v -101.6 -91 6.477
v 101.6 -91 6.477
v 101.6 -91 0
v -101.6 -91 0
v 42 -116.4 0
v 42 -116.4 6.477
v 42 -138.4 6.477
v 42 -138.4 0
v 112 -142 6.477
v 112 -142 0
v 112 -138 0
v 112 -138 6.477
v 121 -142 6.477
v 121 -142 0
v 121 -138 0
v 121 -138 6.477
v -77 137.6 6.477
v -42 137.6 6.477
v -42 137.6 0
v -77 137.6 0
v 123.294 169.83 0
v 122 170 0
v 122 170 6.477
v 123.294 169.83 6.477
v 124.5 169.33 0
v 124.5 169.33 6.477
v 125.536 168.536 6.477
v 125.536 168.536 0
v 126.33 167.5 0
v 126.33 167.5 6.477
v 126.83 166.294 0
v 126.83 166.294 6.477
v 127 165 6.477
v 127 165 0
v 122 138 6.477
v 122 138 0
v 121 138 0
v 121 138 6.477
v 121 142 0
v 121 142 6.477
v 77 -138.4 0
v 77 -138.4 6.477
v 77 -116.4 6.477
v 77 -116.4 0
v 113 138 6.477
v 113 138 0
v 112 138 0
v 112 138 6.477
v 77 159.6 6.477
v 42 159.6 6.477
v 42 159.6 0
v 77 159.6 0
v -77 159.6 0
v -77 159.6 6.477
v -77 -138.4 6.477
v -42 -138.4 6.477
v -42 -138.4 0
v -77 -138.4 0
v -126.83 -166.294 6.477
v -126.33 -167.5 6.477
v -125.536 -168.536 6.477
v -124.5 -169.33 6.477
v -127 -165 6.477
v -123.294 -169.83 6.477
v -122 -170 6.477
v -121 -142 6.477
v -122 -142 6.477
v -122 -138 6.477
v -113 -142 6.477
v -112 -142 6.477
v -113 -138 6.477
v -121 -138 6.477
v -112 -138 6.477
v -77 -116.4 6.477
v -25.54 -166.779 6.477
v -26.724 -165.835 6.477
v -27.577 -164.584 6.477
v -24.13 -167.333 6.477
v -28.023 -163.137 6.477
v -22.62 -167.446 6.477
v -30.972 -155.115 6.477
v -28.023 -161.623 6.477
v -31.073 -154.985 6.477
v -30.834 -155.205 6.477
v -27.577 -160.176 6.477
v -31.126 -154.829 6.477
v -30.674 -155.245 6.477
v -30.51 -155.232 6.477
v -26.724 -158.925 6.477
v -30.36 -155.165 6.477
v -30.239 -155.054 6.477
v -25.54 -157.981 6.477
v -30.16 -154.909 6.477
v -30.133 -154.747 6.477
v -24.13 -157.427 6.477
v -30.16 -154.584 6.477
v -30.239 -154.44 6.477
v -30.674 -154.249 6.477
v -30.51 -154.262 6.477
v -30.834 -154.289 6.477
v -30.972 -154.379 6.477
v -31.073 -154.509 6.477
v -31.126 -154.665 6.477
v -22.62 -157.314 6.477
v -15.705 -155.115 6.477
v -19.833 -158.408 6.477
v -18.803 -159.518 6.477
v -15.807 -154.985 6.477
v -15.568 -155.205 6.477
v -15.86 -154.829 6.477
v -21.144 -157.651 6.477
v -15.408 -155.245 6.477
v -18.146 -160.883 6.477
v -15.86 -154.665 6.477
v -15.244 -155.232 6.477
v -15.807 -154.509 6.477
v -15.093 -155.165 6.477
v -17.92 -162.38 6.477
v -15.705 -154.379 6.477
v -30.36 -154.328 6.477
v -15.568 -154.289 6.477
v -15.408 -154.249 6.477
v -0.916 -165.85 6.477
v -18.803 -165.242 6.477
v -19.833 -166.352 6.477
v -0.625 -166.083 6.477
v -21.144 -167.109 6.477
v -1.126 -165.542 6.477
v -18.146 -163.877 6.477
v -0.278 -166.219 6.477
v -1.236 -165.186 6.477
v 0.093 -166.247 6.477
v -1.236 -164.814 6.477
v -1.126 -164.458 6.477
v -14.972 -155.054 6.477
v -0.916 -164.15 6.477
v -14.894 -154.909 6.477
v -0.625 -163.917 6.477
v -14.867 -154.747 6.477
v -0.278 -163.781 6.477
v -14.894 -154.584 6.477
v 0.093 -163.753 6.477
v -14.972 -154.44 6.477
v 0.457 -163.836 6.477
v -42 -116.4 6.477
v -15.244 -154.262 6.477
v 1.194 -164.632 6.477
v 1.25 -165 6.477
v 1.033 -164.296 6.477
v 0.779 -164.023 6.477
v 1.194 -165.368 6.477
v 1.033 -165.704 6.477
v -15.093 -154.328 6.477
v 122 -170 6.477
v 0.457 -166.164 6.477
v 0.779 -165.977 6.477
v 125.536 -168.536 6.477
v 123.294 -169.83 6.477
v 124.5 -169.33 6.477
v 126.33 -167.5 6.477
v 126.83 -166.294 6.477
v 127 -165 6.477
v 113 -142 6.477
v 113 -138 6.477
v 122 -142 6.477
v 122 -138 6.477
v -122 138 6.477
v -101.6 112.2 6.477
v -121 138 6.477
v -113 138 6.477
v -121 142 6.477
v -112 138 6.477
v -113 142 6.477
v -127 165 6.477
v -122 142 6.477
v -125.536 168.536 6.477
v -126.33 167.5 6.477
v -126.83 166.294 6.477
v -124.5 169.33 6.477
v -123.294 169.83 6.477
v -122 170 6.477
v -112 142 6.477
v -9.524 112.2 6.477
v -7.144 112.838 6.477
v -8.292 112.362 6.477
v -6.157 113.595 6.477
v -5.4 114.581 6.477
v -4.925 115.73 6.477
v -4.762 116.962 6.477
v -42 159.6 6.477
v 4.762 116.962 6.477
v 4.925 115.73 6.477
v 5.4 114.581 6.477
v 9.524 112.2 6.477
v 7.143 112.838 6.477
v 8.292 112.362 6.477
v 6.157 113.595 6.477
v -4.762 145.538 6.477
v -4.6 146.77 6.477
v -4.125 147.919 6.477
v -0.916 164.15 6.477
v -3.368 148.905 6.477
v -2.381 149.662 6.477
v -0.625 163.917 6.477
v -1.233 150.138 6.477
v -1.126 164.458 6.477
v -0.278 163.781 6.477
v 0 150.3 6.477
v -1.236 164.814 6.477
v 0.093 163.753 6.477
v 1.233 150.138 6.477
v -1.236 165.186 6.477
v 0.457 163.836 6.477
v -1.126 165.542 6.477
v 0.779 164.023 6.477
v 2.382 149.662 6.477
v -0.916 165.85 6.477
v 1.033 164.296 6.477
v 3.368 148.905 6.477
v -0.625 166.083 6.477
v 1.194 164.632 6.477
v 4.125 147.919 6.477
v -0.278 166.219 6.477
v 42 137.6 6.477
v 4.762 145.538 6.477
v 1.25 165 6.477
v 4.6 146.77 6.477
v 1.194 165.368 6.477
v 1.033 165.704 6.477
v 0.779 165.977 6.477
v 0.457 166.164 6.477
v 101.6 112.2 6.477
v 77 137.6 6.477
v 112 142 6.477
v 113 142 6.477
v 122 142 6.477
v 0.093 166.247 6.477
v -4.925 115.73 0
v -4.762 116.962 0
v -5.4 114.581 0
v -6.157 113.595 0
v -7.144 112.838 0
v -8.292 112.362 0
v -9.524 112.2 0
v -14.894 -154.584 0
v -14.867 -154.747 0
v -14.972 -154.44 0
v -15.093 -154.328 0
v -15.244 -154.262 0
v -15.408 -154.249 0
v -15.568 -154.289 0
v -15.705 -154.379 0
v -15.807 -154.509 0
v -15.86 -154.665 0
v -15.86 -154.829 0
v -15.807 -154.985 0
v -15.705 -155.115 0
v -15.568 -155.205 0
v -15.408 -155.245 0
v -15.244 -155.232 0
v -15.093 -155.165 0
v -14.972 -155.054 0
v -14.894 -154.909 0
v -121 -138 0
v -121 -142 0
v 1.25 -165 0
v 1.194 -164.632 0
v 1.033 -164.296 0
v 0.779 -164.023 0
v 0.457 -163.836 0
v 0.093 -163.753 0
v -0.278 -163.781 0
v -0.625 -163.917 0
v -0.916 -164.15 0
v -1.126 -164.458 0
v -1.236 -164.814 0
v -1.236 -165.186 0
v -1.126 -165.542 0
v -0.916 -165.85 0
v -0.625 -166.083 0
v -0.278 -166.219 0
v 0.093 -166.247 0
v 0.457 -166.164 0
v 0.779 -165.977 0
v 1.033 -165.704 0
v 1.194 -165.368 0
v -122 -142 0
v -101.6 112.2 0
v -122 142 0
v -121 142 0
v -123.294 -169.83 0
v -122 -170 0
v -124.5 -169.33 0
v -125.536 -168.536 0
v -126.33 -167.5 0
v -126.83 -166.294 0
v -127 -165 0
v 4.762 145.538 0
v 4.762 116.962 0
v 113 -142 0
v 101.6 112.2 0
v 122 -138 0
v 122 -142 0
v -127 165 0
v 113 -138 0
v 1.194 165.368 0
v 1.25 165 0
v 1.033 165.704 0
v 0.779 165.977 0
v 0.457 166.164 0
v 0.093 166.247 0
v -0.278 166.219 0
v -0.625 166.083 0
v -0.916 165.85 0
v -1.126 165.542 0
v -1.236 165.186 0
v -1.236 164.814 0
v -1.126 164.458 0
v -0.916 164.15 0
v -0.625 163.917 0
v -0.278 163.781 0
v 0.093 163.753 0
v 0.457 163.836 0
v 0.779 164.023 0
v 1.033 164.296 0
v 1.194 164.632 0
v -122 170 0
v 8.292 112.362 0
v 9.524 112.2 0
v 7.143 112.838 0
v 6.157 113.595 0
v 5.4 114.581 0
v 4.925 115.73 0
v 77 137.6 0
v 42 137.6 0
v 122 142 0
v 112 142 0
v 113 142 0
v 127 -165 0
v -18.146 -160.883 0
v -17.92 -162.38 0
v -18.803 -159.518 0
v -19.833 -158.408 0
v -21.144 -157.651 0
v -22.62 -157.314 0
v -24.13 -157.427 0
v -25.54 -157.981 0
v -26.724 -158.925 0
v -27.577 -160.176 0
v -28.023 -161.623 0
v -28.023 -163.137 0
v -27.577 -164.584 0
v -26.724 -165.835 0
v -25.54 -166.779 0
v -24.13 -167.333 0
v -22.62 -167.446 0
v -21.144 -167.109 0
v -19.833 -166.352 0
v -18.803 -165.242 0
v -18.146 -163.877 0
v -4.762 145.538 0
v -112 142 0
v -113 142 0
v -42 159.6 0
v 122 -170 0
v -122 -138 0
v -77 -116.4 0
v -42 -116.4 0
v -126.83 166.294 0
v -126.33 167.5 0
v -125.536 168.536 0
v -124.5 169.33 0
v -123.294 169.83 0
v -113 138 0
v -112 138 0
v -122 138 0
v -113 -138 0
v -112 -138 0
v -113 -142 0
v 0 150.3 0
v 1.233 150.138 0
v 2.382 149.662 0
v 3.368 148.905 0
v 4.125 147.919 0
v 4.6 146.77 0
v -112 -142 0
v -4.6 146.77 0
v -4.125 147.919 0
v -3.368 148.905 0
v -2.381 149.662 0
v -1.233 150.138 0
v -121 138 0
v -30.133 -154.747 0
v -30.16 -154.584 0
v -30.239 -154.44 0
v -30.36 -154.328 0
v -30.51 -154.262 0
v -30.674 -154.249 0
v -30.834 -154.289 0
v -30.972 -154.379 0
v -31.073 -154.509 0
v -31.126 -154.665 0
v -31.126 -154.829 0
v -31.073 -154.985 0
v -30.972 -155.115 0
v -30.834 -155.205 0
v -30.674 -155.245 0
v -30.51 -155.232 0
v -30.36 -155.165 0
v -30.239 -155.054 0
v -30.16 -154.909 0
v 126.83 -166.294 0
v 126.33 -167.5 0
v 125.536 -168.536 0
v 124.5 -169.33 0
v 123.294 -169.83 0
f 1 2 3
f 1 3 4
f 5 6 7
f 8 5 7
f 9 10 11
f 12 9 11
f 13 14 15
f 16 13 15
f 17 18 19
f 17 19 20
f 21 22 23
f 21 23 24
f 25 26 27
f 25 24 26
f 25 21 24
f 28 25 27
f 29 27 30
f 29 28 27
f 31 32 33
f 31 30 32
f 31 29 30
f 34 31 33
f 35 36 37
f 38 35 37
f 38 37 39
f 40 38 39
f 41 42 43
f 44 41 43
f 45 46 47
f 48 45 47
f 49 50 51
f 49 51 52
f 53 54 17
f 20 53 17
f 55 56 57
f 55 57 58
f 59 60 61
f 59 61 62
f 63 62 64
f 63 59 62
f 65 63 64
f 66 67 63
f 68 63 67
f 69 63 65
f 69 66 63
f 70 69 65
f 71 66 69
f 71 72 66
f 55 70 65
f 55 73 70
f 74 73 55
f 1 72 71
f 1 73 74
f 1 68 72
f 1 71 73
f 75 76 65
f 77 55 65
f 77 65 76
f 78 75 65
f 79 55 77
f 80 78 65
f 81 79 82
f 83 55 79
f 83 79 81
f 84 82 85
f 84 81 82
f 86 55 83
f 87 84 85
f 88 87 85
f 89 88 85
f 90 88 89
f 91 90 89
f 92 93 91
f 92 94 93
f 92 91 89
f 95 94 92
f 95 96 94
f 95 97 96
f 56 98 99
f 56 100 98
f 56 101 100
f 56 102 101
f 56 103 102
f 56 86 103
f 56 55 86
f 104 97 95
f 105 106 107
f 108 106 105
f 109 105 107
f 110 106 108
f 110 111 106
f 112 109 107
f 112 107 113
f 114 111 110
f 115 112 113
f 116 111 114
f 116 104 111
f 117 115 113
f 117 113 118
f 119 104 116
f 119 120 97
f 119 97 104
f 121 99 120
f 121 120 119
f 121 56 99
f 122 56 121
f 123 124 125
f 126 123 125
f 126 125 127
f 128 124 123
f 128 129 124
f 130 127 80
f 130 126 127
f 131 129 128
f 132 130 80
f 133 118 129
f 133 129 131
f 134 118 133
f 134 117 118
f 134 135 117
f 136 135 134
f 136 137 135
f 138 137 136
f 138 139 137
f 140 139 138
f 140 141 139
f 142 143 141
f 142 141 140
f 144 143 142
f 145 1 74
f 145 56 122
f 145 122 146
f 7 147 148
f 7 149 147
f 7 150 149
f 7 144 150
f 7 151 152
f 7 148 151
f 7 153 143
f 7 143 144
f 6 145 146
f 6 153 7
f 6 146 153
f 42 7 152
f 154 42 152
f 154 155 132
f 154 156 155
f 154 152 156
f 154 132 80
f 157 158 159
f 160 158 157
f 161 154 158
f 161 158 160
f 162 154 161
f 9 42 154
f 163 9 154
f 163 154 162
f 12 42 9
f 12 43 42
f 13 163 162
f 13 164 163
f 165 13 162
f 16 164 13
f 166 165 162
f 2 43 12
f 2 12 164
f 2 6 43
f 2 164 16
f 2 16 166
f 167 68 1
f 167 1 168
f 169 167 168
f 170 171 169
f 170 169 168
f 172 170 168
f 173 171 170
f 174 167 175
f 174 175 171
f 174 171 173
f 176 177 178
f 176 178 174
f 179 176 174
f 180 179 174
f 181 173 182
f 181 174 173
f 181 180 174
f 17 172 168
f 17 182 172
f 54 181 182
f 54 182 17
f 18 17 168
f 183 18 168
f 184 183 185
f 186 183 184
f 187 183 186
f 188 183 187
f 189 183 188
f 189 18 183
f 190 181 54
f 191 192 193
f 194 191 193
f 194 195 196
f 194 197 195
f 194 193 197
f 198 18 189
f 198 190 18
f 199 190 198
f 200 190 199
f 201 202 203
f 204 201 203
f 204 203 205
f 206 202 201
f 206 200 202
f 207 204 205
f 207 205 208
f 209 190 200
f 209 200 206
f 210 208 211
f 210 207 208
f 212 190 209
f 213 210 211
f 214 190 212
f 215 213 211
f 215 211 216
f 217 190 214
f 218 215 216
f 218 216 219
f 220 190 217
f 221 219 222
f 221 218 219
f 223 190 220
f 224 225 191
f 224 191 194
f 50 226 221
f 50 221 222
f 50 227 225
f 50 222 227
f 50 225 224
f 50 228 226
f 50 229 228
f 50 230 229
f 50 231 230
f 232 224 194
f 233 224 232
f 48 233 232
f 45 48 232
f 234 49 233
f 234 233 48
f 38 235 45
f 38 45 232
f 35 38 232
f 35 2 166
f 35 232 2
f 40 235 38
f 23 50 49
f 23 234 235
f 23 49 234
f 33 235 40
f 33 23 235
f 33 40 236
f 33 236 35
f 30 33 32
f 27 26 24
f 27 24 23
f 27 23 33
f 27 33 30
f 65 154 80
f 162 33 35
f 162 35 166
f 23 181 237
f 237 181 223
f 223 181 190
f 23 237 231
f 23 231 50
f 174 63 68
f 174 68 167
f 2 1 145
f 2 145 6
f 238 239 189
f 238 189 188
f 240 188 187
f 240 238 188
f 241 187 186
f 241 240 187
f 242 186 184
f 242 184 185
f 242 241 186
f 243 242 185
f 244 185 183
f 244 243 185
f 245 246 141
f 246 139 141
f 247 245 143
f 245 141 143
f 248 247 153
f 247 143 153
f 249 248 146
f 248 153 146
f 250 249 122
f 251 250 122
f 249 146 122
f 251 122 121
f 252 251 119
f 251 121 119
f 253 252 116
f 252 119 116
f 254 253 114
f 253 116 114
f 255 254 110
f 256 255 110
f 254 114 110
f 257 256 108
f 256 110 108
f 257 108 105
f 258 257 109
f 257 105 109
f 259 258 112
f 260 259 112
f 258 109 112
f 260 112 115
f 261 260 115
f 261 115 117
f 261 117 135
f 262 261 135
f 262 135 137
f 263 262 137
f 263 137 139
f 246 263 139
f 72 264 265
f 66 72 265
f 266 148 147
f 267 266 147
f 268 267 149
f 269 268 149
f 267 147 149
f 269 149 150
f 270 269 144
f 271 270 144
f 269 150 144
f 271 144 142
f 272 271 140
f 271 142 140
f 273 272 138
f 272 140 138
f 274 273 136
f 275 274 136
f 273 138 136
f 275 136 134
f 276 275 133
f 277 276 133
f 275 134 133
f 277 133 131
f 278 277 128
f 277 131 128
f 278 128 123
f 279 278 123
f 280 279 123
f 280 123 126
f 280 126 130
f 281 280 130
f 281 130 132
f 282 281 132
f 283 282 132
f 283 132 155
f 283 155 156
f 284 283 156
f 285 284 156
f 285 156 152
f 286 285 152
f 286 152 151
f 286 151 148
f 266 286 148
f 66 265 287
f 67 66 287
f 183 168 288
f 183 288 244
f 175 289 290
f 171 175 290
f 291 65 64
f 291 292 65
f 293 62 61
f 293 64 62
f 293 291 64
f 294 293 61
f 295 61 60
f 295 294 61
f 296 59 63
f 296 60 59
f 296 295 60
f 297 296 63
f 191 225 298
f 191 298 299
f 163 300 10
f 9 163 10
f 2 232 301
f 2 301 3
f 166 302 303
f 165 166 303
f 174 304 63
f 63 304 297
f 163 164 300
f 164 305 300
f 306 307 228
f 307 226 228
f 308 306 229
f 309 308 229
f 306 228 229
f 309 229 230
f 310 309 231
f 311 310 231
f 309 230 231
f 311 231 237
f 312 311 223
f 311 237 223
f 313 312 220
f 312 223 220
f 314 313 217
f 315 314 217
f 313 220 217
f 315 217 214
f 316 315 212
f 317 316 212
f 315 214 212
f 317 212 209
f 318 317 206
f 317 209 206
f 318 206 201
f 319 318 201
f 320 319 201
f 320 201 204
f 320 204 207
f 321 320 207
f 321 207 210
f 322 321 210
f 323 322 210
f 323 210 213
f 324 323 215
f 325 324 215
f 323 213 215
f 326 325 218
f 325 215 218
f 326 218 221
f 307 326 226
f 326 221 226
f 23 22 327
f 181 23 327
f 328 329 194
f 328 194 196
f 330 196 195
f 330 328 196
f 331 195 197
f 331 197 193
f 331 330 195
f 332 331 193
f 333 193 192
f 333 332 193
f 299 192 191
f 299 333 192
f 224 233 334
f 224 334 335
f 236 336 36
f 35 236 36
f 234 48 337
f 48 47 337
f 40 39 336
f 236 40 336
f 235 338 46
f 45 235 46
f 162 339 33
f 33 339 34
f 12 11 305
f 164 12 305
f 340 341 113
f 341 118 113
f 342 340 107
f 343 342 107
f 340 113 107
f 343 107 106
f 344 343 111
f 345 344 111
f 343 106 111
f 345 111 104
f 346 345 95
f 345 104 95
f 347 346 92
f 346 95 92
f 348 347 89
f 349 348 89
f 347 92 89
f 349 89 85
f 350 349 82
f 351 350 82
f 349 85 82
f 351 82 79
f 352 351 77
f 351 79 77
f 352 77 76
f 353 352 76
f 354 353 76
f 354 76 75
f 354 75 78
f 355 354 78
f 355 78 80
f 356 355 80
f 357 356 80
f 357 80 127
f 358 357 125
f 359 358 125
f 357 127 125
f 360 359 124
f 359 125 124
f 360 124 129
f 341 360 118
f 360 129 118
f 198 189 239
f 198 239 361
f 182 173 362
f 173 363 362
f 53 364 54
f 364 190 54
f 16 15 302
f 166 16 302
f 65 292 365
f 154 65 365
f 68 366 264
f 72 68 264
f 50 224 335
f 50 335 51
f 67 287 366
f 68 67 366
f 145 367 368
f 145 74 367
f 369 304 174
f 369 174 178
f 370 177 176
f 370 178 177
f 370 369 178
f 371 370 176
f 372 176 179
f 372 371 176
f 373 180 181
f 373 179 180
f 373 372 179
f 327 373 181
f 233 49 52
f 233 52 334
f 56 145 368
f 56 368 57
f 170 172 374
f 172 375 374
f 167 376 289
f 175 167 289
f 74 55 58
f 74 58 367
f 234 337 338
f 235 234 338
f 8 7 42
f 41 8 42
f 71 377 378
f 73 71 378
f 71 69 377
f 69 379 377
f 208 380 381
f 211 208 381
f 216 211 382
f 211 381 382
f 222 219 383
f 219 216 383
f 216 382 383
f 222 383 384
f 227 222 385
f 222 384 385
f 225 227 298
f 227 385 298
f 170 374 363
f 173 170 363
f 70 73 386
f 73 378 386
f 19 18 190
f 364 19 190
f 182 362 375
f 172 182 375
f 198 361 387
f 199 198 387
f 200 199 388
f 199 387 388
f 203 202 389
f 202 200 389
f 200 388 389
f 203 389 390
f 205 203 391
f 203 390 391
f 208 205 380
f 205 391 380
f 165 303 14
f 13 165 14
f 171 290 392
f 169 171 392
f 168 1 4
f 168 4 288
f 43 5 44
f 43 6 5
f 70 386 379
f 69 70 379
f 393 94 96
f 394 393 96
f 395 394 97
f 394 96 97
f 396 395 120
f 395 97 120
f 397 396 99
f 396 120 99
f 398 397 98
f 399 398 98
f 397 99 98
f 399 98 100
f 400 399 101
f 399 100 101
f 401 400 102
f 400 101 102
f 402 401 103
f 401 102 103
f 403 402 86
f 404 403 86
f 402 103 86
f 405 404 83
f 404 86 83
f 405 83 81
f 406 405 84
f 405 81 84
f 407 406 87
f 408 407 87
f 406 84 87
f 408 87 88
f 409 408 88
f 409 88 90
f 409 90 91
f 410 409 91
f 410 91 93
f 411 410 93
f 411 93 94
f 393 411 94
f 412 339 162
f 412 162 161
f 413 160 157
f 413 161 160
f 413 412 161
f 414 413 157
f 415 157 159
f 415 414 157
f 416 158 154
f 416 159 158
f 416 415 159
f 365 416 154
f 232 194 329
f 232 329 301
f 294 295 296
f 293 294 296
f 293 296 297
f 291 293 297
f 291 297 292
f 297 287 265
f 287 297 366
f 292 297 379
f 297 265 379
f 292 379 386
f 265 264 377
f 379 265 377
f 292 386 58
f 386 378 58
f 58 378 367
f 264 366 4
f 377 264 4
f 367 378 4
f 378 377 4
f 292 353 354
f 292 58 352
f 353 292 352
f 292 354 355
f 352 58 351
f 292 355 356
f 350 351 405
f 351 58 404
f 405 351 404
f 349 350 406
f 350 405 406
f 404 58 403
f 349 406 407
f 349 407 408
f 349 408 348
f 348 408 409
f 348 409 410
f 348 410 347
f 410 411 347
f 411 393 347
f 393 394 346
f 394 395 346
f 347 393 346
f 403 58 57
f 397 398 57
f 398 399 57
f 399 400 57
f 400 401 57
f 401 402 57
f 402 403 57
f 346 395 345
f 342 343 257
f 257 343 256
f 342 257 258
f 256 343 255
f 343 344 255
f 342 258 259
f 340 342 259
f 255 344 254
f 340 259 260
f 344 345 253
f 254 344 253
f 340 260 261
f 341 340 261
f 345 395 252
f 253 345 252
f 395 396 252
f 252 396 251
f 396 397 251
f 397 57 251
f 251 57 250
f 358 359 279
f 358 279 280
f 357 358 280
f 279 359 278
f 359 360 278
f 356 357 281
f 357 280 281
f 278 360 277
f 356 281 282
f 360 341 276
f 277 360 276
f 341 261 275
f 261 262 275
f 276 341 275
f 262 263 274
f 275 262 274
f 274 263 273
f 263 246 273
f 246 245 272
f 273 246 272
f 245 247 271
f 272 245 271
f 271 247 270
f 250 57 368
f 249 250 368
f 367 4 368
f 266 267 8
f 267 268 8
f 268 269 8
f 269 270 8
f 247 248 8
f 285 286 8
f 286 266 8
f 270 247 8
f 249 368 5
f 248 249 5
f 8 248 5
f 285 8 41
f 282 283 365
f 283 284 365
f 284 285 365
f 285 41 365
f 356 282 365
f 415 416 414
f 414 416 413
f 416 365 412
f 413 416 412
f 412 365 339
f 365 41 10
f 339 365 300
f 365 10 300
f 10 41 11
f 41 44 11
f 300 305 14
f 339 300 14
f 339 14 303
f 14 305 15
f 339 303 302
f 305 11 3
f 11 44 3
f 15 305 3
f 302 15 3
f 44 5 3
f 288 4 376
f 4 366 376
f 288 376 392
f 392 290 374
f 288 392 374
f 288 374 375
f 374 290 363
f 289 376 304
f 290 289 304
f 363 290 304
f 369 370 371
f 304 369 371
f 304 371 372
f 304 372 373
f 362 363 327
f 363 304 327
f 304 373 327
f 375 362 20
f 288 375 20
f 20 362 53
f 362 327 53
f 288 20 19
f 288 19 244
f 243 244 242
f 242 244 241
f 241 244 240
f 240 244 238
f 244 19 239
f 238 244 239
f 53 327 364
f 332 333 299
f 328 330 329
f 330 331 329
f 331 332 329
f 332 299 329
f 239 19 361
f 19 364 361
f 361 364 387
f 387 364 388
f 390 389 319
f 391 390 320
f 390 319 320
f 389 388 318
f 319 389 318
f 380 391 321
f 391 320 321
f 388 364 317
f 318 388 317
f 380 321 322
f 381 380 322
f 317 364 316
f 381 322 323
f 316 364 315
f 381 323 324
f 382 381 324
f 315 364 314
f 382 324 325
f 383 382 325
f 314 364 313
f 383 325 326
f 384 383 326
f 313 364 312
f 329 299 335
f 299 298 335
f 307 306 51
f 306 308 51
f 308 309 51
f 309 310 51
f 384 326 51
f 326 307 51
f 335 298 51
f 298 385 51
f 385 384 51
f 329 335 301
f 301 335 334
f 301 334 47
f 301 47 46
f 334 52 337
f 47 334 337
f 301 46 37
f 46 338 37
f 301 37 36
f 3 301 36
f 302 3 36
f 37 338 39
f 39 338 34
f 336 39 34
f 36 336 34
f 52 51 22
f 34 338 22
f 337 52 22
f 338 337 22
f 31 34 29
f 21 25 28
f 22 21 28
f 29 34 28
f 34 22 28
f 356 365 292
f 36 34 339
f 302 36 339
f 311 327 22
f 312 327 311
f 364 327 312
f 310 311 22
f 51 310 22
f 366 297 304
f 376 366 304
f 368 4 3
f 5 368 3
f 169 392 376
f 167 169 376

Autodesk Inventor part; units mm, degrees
ref_plane "YZ Plane" through (0, 0, 0) normal (1, 0, 0) x (0, 1, 0)
ref_plane "XZ Plane" through (0, 0, 0) normal (0, 1, 0) x (-1, 0, 0)
ref_plane "XY Plane" through (0, 0, 0) normal (0, 0, 1) x (1, 0, 0)
sketch "Sketch1" plane through (0, 0, 0) normal (0, 0, 1) x (1, 0, 0)
  arc A0 (127, -140) -> (122, -135) centre (122, -140) ccw projected
  line L0 (122, -135) -> (119.8284, -135) projected
  line L1 (119.8284, -135) -> (119.8284, -145) projected
  line L2 (119.8284, -145) -> (114.1716, -145) projected
  line L3 (114.1716, -145) -> (114.1716, -135) projected
  line L4 (114.1716, -135) -> (109.5, -135) projected
  arc A1 (107, -132.5) -> (109.5, -135) centre (109.5, -132.5) ccw projected
  line L5 (107, -132.5) -> (107, 132.5) projected
  arc A2 (109.5, 135) -> (107, 132.5) centre (109.5, 132.5) ccw projected
  line L6 (109.5, 135) -> (114.1716, 135) projected
  line L7 (114.1716, 135) -> (114.1716, 145) projected
  line L8 (114.1716, 145) -> (119.8284, 145) projected
  line L9 (119.8284, 145) -> (119.8284, 135) projected
  line L10 (119.8284, 135) -> (122, 135) projected
  arc A3 (122, 135) -> (127, 140) centre (122, 140) ccw projected
  line L11 (127, 140) -> (127, 165) projected
  arc A4 (127, 165) -> (122, 170) centre (122, 165) ccw projected
  line L12 (122, 170) -> (-122, 170) projected
  arc A5 (-122, 170) -> (-127, 165) centre (-122, 165) ccw projected
  line L13 (-127, 165) -> (-127, 140) projected
  arc A6 (-127, 140) -> (-122, 135) centre (-122, 140) ccw projected
  line L14 (-122, 135) -> (-119.8284, 135) projected
  line L15 (-119.8284, 135) -> (-119.8284, 145) projected
  line L16 (-119.8284, 145) -> (-114.1716, 145) projected
  line L17 (-114.1716, 145) -> (-114.1716, 135) projected
  line L18 (-114.1716, 135) -> (-109.5, 135) projected
  arc A7 (-107, 132.5) -> (-109.5, 135) centre (-109.5, 132.5) ccw projected
  line L19 (-107, 132.5) -> (-107, -132.5) projected
  arc A8 (-109.5, -135) -> (-107, -132.5) centre (-109.5, -132.5) ccw projected
  line L20 (-109.5, -135) -> (-114.1716, -135) projected
  line L21 (-114.1716, -135) -> (-114.1716, -145) projected
  line L22 (-114.1716, -145) -> (-119.8284, -145) projected
  line L23 (-119.8284, -145) -> (-119.8284, -135) projected
  line L24 (-119.8284, -135) -> (-122, -135) projected
  arc A9 (-122, -135) -> (-127, -140) centre (-122, -140) ccw projected
  line L25 (-127, -140) -> (-127, -165) projected
  arc A10 (-127, -165) -> (-122, -170) centre (-122, -165) ccw projected
  line L26 (-122, -170) -> (122, -170) projected
  arc A11 (122, -170) -> (127, -165) centre (122, -165) ccw projected
  line L27 (127, -165) -> (127, -140) projected
  line L28 (113, -142) -> (112, -142) projected
  line L29 (112, -142) -> (112, -138) projected
  line L30 (112, -138) -> (113, -138) projected
  line L31 (113, -138) -> (113, -142) projected
  line L32 (121, -142) -> (121, -138) projected
  line L33 (121, -138) -> (122, -138) projected
  line L34 (122, -138) -> (122, -142) projected
  line L35 (122, -142) -> (121, -142) projected
  line L36 (-112, -142) -> (-113, -142) projected
  line L37 (-113, -142) -> (-113, -138) projected
  line L38 (-113, -138) -> (-112, -138) projected
  line L39 (-112, -138) -> (-112, -142) projected
  line L40 (-121, -138) -> (-121, -142) projected
  line L41 (-121, -142) -> (-122, -142) projected
  line L42 (-122, -142) -> (-122, -138) projected
  line L43 (-122, -138) -> (-121, -138) projected
  line L44 (112, 142) -> (113, 142) projected
  line L45 (113, 142) -> (113, 138) projected
  line L46 (113, 138) -> (112, 138) projected
  line L47 (112, 138) -> (112, 142) projected
  line L48 (121, 138) -> (121, 142) projected
  line L49 (121, 142) -> (122, 142) projected
  line L50 (122, 142) -> (122, 138) projected
  line L51 (122, 138) -> (121, 138) projected
  line L52 (-122, 138) -> (-122, 142) projected
  line L53 (-122, 142) -> (-121, 142) projected
  line L54 (-121, 142) -> (-121, 138) projected
  line L55 (-121, 138) -> (-122, 138) projected
  line L56 (-112, 142) -> (-112, 138) projected
  line L57 (-112, 138) -> (-113, 138) projected
  line L58 (-113, 138) -> (-113, 142) projected
  line L59 (-113, 142) -> (-112, 142) projected
  line L60 (-127, 140) -> (-127, -140)
  line L61 (127, -140) -> (127, 140)
  arc A12 (20.5, 83.5) -> (-1.5, 83.5) centre (9.5, 83.5) ccw projected
  line L62 (20.5, 83.5) -> (20.5, -116.5) projected
  arc A13 (-1.5, -116.5) -> (20.5, -116.5) centre (9.5, -116.5) ccw projected
  line L63 (-1.5, -116.5) -> (-1.5, 83.5) projected
  line L64 (42, -96.4) -> (77, -96.4) projected
  line L65 (77, -96.4) -> (77, -138.4) projected
  line L66 (77, -138.4) -> (42, -138.4) projected
  line L67 (42, -138.4) -> (42, -96.4) projected
  line L68 (77, 117.6) -> (42, 117.6) projected
  line L69 (42, 117.6) -> (42, 159.6) projected
  line L70 (42, 159.6) -> (77, 159.6) projected
  line L71 (77, 159.6) -> (77, 117.6) projected
  line L72 (-77, -96.4) -> (-42, -96.4) projected
  line L73 (-42, -96.4) -> (-42, -138.4) projected
  line L74 (-42, -138.4) -> (-77, -138.4) projected
  line L75 (-77, -138.4) -> (-77, -96.4) projected
  line L76 (-42, 117.6) -> (-77, 117.6) projected
  line L77 (-77, 117.6) -> (-77, 159.6) projected
  line L78 (-77, 159.6) -> (-42, 159.6) projected
  line L79 (-42, 159.6) -> (-42, 117.6) projected
  circle A14 centre (0, 165) radius 1.25 projected
  circle A15 centre (0, -165) radius 1.25 projected
  circle A16 centre (-23, -162.38) radius 3.175 projected
  circle A17 centre (-30.6332, -154.7468) radius 0.5 projected
  circle A18 centre (-15.3668, -154.7468) radius 0.5 projected
  point P0 (0, 0)
extrude "Extrusion1" add sketch "Sketch1" along normal blind 6.477 contours L27 A11 L26 A10 L25 A9 L24 L23 L22 L21 L20 A8 L19 A7 L18 L17 L16 L15 L14 A6 L13 A5 L12 A4 L11 A3 L10 L9 L8 L7 L6 A2 L5 A1 L4 L3 L2 L1 L0 A0 | A0 L0 L1 L2 L3 L4 A1 L5 A2 L6 L7 L8 L9 L10 A3 L61 | L60 A6 L14 L15 L16 L17 L18 A7 L19 A8 L20 L21 L22 L23 L24 A9 | L62 A13 L63 A12 | L64 L65 L66 L67 | L68 L69 L70 L71 | L72 L73 L74 L75 | L76 L77 L78 L79 | A14 | A15 | A16 | A17 | A18
sketch "Sketch2" plane through (0, 0, 6.477) normal (0, 0, 1) x (1, 0, 0)
  line L0 (-122, -170) -> (122, -170) projected
  line L1 (-101.6, 112.2) -> (101.6, 112.2)
  line L2 (101.6, 112.2) -> (101.6, -91)
  line L3 (101.6, -91) -> (-101.6, -91)
  line L4 (-101.6, -91) -> (-101.6, 112.2)
  point P0 (0, 0)
  point P1 (0, -91)
  dimension "d2" = 203.2
  dimension "d4" = 79
extrude "Extrusion2" cut sketch "Sketch2" against normal through all
sketch "Sketch3" plane through (0, 0, 6.477) normal (0, 0, 1) x (1, 0, 0)
  line L0 (-127, 165) -> (-127, -165) projected
  line L1 (127, 137.6) -> (-127, 137.6) projected
  line L2 (-127, -116.4) -> (127, -116.4) projected
  line L3 (-77, -116.4) -> (-42, -116.4)
  line L4 (-42, -116.4) -> (-42, -138.4)
  line L5 (-42, -138.4) -> (-77, -138.4)
  line L6 (-77, -138.4) -> (-77, -116.4)
  line L7 (77, -116.4) -> (42, -116.4)
  line L8 (42, -116.4) -> (42, -138.4)
  line L9 (42, -138.4) -> (77, -138.4)
  line L10 (77, -138.4) -> (77, -116.4)
  line L11 (-77, 137.6) -> (-42, 137.6)
  line L12 (-42, 137.6) -> (-42, 159.6)
  line L13 (-42, 159.6) -> (-77, 159.6)
  line L14 (-77, 159.6) -> (-77, 137.6)
  line L15 (77, 137.6) -> (42, 137.6)
  line L16 (42, 137.6) -> (42, 159.6)
  line L17 (42, 159.6) -> (77, 159.6)
  line L18 (77, 159.6) -> (77, 137.6)
  line L19 (-42, -138.4) -> (42, -138.4)
  line L20 (-42, 159.6) -> (42, 159.6)
  point P0 (0, 0)
  point P1 (0, -138.4)
  point P2 (0, -116.4)
  point P3 (0, 159.6)
  dimension "d7" = 22
  dimension "d9" = 35
  dimension "d10" = 50
extrude "Extrusion3" cut sketch "Sketch3" against normal through all contours L2 L4 L5 L6 | L14 L13 L12 L1 | L16 L17 L18 L1 | L2 L10 L9 L8
sketch "Sketch4" plane through (0, 0, 6.477) normal (0, 0, 1) x (1, 0, 0)
  circle A0 centre (0, 165) radius 1.25 projected
  circle A1 centre (0, -165) radius 1.25 projected
  point P0 (0, 0)
extrude "Extrusion4" cut sketch "Sketch4" against normal through all
sketch "Sketch5" plane through (0, 0, 6.477) normal (0, 0, 1) x (1, 0, 0)
  circle A0 centre (-23, -162.38) radius 5.08 projected
  point P0 (0, 0)
extrude "Extrusion5" cut sketch "Sketch5" against normal through all
sketch "Sketch6" plane through (0, 0, 6.477) normal (0, 0, 1) x (1, 0, 0)
  circle A0 centre (-30.6332, -154.7468) radius 0.5 projected
  circle A1 centre (-15.3668, -154.7468) radius 0.5 projected
  circle A2 centre (-23, -162.38) radius 5.08 projected
  line L0 (-15.5, -150) -> (-30.5, -150) projected
  line L1 (-35.5, -155) -> (-35.5, -165) projected
  line L2 (-30.5, -170) -> (-15.5, -170) projected
  line L3 (-10.5, -165) -> (-10.5, -155) projected
  arc A3 (-30.5, -150) -> (-35.5, -155) centre (-30.5, -155) ccw projected
  arc A4 (-35.5, -165) -> (-30.5, -170) centre (-30.5, -165) ccw projected
  arc A5 (-15.5, -170) -> (-10.5, -165) centre (-15.5, -165) ccw projected
  arc A6 (-10.5, -155) -> (-15.5, -150) centre (-15.5, -155) ccw projected
  point P0 (0, 0)
extrude "Extrusion6" cut sketch "Sketch6" against normal through all contours A0 | A1
sketch "Sketch7" plane through (0, 0, 6.477) normal (0, 0, 1) x (1, 0, 0)
  line L0 (-101.6, 112.2) -> (101.6, 112.2) projected
  line L1 (4.7625, 112.2) -> (-4.7625, 112.2)
  line L2 (-4.7625, 112.2) -> (-4.7625, 150.3)
  line L3 (-4.7625, 150.3) -> (4.7625, 150.3)
  line L4 (4.7625, 150.3) -> (4.7625, 112.2)
  point P0 (0, 0)
  point P1 (0, 150.3)
  point P2 (0, 112.2)
  dimension "d19" = 38.1
  dimension "d21" = 9.525
extrude "Extrusion7" cut sketch "Sketch7" against normal through all
fillet "Fillet1" radius 4.7625 4 edges at (4.7625, 112.2, 3.2385) (-4.7625, 112.2, 3.2385) (-4.7625, 150.3, 3.2385) (4.7625, 150.3, 3.2385)
properties part number "BED HOT BED INSET"
